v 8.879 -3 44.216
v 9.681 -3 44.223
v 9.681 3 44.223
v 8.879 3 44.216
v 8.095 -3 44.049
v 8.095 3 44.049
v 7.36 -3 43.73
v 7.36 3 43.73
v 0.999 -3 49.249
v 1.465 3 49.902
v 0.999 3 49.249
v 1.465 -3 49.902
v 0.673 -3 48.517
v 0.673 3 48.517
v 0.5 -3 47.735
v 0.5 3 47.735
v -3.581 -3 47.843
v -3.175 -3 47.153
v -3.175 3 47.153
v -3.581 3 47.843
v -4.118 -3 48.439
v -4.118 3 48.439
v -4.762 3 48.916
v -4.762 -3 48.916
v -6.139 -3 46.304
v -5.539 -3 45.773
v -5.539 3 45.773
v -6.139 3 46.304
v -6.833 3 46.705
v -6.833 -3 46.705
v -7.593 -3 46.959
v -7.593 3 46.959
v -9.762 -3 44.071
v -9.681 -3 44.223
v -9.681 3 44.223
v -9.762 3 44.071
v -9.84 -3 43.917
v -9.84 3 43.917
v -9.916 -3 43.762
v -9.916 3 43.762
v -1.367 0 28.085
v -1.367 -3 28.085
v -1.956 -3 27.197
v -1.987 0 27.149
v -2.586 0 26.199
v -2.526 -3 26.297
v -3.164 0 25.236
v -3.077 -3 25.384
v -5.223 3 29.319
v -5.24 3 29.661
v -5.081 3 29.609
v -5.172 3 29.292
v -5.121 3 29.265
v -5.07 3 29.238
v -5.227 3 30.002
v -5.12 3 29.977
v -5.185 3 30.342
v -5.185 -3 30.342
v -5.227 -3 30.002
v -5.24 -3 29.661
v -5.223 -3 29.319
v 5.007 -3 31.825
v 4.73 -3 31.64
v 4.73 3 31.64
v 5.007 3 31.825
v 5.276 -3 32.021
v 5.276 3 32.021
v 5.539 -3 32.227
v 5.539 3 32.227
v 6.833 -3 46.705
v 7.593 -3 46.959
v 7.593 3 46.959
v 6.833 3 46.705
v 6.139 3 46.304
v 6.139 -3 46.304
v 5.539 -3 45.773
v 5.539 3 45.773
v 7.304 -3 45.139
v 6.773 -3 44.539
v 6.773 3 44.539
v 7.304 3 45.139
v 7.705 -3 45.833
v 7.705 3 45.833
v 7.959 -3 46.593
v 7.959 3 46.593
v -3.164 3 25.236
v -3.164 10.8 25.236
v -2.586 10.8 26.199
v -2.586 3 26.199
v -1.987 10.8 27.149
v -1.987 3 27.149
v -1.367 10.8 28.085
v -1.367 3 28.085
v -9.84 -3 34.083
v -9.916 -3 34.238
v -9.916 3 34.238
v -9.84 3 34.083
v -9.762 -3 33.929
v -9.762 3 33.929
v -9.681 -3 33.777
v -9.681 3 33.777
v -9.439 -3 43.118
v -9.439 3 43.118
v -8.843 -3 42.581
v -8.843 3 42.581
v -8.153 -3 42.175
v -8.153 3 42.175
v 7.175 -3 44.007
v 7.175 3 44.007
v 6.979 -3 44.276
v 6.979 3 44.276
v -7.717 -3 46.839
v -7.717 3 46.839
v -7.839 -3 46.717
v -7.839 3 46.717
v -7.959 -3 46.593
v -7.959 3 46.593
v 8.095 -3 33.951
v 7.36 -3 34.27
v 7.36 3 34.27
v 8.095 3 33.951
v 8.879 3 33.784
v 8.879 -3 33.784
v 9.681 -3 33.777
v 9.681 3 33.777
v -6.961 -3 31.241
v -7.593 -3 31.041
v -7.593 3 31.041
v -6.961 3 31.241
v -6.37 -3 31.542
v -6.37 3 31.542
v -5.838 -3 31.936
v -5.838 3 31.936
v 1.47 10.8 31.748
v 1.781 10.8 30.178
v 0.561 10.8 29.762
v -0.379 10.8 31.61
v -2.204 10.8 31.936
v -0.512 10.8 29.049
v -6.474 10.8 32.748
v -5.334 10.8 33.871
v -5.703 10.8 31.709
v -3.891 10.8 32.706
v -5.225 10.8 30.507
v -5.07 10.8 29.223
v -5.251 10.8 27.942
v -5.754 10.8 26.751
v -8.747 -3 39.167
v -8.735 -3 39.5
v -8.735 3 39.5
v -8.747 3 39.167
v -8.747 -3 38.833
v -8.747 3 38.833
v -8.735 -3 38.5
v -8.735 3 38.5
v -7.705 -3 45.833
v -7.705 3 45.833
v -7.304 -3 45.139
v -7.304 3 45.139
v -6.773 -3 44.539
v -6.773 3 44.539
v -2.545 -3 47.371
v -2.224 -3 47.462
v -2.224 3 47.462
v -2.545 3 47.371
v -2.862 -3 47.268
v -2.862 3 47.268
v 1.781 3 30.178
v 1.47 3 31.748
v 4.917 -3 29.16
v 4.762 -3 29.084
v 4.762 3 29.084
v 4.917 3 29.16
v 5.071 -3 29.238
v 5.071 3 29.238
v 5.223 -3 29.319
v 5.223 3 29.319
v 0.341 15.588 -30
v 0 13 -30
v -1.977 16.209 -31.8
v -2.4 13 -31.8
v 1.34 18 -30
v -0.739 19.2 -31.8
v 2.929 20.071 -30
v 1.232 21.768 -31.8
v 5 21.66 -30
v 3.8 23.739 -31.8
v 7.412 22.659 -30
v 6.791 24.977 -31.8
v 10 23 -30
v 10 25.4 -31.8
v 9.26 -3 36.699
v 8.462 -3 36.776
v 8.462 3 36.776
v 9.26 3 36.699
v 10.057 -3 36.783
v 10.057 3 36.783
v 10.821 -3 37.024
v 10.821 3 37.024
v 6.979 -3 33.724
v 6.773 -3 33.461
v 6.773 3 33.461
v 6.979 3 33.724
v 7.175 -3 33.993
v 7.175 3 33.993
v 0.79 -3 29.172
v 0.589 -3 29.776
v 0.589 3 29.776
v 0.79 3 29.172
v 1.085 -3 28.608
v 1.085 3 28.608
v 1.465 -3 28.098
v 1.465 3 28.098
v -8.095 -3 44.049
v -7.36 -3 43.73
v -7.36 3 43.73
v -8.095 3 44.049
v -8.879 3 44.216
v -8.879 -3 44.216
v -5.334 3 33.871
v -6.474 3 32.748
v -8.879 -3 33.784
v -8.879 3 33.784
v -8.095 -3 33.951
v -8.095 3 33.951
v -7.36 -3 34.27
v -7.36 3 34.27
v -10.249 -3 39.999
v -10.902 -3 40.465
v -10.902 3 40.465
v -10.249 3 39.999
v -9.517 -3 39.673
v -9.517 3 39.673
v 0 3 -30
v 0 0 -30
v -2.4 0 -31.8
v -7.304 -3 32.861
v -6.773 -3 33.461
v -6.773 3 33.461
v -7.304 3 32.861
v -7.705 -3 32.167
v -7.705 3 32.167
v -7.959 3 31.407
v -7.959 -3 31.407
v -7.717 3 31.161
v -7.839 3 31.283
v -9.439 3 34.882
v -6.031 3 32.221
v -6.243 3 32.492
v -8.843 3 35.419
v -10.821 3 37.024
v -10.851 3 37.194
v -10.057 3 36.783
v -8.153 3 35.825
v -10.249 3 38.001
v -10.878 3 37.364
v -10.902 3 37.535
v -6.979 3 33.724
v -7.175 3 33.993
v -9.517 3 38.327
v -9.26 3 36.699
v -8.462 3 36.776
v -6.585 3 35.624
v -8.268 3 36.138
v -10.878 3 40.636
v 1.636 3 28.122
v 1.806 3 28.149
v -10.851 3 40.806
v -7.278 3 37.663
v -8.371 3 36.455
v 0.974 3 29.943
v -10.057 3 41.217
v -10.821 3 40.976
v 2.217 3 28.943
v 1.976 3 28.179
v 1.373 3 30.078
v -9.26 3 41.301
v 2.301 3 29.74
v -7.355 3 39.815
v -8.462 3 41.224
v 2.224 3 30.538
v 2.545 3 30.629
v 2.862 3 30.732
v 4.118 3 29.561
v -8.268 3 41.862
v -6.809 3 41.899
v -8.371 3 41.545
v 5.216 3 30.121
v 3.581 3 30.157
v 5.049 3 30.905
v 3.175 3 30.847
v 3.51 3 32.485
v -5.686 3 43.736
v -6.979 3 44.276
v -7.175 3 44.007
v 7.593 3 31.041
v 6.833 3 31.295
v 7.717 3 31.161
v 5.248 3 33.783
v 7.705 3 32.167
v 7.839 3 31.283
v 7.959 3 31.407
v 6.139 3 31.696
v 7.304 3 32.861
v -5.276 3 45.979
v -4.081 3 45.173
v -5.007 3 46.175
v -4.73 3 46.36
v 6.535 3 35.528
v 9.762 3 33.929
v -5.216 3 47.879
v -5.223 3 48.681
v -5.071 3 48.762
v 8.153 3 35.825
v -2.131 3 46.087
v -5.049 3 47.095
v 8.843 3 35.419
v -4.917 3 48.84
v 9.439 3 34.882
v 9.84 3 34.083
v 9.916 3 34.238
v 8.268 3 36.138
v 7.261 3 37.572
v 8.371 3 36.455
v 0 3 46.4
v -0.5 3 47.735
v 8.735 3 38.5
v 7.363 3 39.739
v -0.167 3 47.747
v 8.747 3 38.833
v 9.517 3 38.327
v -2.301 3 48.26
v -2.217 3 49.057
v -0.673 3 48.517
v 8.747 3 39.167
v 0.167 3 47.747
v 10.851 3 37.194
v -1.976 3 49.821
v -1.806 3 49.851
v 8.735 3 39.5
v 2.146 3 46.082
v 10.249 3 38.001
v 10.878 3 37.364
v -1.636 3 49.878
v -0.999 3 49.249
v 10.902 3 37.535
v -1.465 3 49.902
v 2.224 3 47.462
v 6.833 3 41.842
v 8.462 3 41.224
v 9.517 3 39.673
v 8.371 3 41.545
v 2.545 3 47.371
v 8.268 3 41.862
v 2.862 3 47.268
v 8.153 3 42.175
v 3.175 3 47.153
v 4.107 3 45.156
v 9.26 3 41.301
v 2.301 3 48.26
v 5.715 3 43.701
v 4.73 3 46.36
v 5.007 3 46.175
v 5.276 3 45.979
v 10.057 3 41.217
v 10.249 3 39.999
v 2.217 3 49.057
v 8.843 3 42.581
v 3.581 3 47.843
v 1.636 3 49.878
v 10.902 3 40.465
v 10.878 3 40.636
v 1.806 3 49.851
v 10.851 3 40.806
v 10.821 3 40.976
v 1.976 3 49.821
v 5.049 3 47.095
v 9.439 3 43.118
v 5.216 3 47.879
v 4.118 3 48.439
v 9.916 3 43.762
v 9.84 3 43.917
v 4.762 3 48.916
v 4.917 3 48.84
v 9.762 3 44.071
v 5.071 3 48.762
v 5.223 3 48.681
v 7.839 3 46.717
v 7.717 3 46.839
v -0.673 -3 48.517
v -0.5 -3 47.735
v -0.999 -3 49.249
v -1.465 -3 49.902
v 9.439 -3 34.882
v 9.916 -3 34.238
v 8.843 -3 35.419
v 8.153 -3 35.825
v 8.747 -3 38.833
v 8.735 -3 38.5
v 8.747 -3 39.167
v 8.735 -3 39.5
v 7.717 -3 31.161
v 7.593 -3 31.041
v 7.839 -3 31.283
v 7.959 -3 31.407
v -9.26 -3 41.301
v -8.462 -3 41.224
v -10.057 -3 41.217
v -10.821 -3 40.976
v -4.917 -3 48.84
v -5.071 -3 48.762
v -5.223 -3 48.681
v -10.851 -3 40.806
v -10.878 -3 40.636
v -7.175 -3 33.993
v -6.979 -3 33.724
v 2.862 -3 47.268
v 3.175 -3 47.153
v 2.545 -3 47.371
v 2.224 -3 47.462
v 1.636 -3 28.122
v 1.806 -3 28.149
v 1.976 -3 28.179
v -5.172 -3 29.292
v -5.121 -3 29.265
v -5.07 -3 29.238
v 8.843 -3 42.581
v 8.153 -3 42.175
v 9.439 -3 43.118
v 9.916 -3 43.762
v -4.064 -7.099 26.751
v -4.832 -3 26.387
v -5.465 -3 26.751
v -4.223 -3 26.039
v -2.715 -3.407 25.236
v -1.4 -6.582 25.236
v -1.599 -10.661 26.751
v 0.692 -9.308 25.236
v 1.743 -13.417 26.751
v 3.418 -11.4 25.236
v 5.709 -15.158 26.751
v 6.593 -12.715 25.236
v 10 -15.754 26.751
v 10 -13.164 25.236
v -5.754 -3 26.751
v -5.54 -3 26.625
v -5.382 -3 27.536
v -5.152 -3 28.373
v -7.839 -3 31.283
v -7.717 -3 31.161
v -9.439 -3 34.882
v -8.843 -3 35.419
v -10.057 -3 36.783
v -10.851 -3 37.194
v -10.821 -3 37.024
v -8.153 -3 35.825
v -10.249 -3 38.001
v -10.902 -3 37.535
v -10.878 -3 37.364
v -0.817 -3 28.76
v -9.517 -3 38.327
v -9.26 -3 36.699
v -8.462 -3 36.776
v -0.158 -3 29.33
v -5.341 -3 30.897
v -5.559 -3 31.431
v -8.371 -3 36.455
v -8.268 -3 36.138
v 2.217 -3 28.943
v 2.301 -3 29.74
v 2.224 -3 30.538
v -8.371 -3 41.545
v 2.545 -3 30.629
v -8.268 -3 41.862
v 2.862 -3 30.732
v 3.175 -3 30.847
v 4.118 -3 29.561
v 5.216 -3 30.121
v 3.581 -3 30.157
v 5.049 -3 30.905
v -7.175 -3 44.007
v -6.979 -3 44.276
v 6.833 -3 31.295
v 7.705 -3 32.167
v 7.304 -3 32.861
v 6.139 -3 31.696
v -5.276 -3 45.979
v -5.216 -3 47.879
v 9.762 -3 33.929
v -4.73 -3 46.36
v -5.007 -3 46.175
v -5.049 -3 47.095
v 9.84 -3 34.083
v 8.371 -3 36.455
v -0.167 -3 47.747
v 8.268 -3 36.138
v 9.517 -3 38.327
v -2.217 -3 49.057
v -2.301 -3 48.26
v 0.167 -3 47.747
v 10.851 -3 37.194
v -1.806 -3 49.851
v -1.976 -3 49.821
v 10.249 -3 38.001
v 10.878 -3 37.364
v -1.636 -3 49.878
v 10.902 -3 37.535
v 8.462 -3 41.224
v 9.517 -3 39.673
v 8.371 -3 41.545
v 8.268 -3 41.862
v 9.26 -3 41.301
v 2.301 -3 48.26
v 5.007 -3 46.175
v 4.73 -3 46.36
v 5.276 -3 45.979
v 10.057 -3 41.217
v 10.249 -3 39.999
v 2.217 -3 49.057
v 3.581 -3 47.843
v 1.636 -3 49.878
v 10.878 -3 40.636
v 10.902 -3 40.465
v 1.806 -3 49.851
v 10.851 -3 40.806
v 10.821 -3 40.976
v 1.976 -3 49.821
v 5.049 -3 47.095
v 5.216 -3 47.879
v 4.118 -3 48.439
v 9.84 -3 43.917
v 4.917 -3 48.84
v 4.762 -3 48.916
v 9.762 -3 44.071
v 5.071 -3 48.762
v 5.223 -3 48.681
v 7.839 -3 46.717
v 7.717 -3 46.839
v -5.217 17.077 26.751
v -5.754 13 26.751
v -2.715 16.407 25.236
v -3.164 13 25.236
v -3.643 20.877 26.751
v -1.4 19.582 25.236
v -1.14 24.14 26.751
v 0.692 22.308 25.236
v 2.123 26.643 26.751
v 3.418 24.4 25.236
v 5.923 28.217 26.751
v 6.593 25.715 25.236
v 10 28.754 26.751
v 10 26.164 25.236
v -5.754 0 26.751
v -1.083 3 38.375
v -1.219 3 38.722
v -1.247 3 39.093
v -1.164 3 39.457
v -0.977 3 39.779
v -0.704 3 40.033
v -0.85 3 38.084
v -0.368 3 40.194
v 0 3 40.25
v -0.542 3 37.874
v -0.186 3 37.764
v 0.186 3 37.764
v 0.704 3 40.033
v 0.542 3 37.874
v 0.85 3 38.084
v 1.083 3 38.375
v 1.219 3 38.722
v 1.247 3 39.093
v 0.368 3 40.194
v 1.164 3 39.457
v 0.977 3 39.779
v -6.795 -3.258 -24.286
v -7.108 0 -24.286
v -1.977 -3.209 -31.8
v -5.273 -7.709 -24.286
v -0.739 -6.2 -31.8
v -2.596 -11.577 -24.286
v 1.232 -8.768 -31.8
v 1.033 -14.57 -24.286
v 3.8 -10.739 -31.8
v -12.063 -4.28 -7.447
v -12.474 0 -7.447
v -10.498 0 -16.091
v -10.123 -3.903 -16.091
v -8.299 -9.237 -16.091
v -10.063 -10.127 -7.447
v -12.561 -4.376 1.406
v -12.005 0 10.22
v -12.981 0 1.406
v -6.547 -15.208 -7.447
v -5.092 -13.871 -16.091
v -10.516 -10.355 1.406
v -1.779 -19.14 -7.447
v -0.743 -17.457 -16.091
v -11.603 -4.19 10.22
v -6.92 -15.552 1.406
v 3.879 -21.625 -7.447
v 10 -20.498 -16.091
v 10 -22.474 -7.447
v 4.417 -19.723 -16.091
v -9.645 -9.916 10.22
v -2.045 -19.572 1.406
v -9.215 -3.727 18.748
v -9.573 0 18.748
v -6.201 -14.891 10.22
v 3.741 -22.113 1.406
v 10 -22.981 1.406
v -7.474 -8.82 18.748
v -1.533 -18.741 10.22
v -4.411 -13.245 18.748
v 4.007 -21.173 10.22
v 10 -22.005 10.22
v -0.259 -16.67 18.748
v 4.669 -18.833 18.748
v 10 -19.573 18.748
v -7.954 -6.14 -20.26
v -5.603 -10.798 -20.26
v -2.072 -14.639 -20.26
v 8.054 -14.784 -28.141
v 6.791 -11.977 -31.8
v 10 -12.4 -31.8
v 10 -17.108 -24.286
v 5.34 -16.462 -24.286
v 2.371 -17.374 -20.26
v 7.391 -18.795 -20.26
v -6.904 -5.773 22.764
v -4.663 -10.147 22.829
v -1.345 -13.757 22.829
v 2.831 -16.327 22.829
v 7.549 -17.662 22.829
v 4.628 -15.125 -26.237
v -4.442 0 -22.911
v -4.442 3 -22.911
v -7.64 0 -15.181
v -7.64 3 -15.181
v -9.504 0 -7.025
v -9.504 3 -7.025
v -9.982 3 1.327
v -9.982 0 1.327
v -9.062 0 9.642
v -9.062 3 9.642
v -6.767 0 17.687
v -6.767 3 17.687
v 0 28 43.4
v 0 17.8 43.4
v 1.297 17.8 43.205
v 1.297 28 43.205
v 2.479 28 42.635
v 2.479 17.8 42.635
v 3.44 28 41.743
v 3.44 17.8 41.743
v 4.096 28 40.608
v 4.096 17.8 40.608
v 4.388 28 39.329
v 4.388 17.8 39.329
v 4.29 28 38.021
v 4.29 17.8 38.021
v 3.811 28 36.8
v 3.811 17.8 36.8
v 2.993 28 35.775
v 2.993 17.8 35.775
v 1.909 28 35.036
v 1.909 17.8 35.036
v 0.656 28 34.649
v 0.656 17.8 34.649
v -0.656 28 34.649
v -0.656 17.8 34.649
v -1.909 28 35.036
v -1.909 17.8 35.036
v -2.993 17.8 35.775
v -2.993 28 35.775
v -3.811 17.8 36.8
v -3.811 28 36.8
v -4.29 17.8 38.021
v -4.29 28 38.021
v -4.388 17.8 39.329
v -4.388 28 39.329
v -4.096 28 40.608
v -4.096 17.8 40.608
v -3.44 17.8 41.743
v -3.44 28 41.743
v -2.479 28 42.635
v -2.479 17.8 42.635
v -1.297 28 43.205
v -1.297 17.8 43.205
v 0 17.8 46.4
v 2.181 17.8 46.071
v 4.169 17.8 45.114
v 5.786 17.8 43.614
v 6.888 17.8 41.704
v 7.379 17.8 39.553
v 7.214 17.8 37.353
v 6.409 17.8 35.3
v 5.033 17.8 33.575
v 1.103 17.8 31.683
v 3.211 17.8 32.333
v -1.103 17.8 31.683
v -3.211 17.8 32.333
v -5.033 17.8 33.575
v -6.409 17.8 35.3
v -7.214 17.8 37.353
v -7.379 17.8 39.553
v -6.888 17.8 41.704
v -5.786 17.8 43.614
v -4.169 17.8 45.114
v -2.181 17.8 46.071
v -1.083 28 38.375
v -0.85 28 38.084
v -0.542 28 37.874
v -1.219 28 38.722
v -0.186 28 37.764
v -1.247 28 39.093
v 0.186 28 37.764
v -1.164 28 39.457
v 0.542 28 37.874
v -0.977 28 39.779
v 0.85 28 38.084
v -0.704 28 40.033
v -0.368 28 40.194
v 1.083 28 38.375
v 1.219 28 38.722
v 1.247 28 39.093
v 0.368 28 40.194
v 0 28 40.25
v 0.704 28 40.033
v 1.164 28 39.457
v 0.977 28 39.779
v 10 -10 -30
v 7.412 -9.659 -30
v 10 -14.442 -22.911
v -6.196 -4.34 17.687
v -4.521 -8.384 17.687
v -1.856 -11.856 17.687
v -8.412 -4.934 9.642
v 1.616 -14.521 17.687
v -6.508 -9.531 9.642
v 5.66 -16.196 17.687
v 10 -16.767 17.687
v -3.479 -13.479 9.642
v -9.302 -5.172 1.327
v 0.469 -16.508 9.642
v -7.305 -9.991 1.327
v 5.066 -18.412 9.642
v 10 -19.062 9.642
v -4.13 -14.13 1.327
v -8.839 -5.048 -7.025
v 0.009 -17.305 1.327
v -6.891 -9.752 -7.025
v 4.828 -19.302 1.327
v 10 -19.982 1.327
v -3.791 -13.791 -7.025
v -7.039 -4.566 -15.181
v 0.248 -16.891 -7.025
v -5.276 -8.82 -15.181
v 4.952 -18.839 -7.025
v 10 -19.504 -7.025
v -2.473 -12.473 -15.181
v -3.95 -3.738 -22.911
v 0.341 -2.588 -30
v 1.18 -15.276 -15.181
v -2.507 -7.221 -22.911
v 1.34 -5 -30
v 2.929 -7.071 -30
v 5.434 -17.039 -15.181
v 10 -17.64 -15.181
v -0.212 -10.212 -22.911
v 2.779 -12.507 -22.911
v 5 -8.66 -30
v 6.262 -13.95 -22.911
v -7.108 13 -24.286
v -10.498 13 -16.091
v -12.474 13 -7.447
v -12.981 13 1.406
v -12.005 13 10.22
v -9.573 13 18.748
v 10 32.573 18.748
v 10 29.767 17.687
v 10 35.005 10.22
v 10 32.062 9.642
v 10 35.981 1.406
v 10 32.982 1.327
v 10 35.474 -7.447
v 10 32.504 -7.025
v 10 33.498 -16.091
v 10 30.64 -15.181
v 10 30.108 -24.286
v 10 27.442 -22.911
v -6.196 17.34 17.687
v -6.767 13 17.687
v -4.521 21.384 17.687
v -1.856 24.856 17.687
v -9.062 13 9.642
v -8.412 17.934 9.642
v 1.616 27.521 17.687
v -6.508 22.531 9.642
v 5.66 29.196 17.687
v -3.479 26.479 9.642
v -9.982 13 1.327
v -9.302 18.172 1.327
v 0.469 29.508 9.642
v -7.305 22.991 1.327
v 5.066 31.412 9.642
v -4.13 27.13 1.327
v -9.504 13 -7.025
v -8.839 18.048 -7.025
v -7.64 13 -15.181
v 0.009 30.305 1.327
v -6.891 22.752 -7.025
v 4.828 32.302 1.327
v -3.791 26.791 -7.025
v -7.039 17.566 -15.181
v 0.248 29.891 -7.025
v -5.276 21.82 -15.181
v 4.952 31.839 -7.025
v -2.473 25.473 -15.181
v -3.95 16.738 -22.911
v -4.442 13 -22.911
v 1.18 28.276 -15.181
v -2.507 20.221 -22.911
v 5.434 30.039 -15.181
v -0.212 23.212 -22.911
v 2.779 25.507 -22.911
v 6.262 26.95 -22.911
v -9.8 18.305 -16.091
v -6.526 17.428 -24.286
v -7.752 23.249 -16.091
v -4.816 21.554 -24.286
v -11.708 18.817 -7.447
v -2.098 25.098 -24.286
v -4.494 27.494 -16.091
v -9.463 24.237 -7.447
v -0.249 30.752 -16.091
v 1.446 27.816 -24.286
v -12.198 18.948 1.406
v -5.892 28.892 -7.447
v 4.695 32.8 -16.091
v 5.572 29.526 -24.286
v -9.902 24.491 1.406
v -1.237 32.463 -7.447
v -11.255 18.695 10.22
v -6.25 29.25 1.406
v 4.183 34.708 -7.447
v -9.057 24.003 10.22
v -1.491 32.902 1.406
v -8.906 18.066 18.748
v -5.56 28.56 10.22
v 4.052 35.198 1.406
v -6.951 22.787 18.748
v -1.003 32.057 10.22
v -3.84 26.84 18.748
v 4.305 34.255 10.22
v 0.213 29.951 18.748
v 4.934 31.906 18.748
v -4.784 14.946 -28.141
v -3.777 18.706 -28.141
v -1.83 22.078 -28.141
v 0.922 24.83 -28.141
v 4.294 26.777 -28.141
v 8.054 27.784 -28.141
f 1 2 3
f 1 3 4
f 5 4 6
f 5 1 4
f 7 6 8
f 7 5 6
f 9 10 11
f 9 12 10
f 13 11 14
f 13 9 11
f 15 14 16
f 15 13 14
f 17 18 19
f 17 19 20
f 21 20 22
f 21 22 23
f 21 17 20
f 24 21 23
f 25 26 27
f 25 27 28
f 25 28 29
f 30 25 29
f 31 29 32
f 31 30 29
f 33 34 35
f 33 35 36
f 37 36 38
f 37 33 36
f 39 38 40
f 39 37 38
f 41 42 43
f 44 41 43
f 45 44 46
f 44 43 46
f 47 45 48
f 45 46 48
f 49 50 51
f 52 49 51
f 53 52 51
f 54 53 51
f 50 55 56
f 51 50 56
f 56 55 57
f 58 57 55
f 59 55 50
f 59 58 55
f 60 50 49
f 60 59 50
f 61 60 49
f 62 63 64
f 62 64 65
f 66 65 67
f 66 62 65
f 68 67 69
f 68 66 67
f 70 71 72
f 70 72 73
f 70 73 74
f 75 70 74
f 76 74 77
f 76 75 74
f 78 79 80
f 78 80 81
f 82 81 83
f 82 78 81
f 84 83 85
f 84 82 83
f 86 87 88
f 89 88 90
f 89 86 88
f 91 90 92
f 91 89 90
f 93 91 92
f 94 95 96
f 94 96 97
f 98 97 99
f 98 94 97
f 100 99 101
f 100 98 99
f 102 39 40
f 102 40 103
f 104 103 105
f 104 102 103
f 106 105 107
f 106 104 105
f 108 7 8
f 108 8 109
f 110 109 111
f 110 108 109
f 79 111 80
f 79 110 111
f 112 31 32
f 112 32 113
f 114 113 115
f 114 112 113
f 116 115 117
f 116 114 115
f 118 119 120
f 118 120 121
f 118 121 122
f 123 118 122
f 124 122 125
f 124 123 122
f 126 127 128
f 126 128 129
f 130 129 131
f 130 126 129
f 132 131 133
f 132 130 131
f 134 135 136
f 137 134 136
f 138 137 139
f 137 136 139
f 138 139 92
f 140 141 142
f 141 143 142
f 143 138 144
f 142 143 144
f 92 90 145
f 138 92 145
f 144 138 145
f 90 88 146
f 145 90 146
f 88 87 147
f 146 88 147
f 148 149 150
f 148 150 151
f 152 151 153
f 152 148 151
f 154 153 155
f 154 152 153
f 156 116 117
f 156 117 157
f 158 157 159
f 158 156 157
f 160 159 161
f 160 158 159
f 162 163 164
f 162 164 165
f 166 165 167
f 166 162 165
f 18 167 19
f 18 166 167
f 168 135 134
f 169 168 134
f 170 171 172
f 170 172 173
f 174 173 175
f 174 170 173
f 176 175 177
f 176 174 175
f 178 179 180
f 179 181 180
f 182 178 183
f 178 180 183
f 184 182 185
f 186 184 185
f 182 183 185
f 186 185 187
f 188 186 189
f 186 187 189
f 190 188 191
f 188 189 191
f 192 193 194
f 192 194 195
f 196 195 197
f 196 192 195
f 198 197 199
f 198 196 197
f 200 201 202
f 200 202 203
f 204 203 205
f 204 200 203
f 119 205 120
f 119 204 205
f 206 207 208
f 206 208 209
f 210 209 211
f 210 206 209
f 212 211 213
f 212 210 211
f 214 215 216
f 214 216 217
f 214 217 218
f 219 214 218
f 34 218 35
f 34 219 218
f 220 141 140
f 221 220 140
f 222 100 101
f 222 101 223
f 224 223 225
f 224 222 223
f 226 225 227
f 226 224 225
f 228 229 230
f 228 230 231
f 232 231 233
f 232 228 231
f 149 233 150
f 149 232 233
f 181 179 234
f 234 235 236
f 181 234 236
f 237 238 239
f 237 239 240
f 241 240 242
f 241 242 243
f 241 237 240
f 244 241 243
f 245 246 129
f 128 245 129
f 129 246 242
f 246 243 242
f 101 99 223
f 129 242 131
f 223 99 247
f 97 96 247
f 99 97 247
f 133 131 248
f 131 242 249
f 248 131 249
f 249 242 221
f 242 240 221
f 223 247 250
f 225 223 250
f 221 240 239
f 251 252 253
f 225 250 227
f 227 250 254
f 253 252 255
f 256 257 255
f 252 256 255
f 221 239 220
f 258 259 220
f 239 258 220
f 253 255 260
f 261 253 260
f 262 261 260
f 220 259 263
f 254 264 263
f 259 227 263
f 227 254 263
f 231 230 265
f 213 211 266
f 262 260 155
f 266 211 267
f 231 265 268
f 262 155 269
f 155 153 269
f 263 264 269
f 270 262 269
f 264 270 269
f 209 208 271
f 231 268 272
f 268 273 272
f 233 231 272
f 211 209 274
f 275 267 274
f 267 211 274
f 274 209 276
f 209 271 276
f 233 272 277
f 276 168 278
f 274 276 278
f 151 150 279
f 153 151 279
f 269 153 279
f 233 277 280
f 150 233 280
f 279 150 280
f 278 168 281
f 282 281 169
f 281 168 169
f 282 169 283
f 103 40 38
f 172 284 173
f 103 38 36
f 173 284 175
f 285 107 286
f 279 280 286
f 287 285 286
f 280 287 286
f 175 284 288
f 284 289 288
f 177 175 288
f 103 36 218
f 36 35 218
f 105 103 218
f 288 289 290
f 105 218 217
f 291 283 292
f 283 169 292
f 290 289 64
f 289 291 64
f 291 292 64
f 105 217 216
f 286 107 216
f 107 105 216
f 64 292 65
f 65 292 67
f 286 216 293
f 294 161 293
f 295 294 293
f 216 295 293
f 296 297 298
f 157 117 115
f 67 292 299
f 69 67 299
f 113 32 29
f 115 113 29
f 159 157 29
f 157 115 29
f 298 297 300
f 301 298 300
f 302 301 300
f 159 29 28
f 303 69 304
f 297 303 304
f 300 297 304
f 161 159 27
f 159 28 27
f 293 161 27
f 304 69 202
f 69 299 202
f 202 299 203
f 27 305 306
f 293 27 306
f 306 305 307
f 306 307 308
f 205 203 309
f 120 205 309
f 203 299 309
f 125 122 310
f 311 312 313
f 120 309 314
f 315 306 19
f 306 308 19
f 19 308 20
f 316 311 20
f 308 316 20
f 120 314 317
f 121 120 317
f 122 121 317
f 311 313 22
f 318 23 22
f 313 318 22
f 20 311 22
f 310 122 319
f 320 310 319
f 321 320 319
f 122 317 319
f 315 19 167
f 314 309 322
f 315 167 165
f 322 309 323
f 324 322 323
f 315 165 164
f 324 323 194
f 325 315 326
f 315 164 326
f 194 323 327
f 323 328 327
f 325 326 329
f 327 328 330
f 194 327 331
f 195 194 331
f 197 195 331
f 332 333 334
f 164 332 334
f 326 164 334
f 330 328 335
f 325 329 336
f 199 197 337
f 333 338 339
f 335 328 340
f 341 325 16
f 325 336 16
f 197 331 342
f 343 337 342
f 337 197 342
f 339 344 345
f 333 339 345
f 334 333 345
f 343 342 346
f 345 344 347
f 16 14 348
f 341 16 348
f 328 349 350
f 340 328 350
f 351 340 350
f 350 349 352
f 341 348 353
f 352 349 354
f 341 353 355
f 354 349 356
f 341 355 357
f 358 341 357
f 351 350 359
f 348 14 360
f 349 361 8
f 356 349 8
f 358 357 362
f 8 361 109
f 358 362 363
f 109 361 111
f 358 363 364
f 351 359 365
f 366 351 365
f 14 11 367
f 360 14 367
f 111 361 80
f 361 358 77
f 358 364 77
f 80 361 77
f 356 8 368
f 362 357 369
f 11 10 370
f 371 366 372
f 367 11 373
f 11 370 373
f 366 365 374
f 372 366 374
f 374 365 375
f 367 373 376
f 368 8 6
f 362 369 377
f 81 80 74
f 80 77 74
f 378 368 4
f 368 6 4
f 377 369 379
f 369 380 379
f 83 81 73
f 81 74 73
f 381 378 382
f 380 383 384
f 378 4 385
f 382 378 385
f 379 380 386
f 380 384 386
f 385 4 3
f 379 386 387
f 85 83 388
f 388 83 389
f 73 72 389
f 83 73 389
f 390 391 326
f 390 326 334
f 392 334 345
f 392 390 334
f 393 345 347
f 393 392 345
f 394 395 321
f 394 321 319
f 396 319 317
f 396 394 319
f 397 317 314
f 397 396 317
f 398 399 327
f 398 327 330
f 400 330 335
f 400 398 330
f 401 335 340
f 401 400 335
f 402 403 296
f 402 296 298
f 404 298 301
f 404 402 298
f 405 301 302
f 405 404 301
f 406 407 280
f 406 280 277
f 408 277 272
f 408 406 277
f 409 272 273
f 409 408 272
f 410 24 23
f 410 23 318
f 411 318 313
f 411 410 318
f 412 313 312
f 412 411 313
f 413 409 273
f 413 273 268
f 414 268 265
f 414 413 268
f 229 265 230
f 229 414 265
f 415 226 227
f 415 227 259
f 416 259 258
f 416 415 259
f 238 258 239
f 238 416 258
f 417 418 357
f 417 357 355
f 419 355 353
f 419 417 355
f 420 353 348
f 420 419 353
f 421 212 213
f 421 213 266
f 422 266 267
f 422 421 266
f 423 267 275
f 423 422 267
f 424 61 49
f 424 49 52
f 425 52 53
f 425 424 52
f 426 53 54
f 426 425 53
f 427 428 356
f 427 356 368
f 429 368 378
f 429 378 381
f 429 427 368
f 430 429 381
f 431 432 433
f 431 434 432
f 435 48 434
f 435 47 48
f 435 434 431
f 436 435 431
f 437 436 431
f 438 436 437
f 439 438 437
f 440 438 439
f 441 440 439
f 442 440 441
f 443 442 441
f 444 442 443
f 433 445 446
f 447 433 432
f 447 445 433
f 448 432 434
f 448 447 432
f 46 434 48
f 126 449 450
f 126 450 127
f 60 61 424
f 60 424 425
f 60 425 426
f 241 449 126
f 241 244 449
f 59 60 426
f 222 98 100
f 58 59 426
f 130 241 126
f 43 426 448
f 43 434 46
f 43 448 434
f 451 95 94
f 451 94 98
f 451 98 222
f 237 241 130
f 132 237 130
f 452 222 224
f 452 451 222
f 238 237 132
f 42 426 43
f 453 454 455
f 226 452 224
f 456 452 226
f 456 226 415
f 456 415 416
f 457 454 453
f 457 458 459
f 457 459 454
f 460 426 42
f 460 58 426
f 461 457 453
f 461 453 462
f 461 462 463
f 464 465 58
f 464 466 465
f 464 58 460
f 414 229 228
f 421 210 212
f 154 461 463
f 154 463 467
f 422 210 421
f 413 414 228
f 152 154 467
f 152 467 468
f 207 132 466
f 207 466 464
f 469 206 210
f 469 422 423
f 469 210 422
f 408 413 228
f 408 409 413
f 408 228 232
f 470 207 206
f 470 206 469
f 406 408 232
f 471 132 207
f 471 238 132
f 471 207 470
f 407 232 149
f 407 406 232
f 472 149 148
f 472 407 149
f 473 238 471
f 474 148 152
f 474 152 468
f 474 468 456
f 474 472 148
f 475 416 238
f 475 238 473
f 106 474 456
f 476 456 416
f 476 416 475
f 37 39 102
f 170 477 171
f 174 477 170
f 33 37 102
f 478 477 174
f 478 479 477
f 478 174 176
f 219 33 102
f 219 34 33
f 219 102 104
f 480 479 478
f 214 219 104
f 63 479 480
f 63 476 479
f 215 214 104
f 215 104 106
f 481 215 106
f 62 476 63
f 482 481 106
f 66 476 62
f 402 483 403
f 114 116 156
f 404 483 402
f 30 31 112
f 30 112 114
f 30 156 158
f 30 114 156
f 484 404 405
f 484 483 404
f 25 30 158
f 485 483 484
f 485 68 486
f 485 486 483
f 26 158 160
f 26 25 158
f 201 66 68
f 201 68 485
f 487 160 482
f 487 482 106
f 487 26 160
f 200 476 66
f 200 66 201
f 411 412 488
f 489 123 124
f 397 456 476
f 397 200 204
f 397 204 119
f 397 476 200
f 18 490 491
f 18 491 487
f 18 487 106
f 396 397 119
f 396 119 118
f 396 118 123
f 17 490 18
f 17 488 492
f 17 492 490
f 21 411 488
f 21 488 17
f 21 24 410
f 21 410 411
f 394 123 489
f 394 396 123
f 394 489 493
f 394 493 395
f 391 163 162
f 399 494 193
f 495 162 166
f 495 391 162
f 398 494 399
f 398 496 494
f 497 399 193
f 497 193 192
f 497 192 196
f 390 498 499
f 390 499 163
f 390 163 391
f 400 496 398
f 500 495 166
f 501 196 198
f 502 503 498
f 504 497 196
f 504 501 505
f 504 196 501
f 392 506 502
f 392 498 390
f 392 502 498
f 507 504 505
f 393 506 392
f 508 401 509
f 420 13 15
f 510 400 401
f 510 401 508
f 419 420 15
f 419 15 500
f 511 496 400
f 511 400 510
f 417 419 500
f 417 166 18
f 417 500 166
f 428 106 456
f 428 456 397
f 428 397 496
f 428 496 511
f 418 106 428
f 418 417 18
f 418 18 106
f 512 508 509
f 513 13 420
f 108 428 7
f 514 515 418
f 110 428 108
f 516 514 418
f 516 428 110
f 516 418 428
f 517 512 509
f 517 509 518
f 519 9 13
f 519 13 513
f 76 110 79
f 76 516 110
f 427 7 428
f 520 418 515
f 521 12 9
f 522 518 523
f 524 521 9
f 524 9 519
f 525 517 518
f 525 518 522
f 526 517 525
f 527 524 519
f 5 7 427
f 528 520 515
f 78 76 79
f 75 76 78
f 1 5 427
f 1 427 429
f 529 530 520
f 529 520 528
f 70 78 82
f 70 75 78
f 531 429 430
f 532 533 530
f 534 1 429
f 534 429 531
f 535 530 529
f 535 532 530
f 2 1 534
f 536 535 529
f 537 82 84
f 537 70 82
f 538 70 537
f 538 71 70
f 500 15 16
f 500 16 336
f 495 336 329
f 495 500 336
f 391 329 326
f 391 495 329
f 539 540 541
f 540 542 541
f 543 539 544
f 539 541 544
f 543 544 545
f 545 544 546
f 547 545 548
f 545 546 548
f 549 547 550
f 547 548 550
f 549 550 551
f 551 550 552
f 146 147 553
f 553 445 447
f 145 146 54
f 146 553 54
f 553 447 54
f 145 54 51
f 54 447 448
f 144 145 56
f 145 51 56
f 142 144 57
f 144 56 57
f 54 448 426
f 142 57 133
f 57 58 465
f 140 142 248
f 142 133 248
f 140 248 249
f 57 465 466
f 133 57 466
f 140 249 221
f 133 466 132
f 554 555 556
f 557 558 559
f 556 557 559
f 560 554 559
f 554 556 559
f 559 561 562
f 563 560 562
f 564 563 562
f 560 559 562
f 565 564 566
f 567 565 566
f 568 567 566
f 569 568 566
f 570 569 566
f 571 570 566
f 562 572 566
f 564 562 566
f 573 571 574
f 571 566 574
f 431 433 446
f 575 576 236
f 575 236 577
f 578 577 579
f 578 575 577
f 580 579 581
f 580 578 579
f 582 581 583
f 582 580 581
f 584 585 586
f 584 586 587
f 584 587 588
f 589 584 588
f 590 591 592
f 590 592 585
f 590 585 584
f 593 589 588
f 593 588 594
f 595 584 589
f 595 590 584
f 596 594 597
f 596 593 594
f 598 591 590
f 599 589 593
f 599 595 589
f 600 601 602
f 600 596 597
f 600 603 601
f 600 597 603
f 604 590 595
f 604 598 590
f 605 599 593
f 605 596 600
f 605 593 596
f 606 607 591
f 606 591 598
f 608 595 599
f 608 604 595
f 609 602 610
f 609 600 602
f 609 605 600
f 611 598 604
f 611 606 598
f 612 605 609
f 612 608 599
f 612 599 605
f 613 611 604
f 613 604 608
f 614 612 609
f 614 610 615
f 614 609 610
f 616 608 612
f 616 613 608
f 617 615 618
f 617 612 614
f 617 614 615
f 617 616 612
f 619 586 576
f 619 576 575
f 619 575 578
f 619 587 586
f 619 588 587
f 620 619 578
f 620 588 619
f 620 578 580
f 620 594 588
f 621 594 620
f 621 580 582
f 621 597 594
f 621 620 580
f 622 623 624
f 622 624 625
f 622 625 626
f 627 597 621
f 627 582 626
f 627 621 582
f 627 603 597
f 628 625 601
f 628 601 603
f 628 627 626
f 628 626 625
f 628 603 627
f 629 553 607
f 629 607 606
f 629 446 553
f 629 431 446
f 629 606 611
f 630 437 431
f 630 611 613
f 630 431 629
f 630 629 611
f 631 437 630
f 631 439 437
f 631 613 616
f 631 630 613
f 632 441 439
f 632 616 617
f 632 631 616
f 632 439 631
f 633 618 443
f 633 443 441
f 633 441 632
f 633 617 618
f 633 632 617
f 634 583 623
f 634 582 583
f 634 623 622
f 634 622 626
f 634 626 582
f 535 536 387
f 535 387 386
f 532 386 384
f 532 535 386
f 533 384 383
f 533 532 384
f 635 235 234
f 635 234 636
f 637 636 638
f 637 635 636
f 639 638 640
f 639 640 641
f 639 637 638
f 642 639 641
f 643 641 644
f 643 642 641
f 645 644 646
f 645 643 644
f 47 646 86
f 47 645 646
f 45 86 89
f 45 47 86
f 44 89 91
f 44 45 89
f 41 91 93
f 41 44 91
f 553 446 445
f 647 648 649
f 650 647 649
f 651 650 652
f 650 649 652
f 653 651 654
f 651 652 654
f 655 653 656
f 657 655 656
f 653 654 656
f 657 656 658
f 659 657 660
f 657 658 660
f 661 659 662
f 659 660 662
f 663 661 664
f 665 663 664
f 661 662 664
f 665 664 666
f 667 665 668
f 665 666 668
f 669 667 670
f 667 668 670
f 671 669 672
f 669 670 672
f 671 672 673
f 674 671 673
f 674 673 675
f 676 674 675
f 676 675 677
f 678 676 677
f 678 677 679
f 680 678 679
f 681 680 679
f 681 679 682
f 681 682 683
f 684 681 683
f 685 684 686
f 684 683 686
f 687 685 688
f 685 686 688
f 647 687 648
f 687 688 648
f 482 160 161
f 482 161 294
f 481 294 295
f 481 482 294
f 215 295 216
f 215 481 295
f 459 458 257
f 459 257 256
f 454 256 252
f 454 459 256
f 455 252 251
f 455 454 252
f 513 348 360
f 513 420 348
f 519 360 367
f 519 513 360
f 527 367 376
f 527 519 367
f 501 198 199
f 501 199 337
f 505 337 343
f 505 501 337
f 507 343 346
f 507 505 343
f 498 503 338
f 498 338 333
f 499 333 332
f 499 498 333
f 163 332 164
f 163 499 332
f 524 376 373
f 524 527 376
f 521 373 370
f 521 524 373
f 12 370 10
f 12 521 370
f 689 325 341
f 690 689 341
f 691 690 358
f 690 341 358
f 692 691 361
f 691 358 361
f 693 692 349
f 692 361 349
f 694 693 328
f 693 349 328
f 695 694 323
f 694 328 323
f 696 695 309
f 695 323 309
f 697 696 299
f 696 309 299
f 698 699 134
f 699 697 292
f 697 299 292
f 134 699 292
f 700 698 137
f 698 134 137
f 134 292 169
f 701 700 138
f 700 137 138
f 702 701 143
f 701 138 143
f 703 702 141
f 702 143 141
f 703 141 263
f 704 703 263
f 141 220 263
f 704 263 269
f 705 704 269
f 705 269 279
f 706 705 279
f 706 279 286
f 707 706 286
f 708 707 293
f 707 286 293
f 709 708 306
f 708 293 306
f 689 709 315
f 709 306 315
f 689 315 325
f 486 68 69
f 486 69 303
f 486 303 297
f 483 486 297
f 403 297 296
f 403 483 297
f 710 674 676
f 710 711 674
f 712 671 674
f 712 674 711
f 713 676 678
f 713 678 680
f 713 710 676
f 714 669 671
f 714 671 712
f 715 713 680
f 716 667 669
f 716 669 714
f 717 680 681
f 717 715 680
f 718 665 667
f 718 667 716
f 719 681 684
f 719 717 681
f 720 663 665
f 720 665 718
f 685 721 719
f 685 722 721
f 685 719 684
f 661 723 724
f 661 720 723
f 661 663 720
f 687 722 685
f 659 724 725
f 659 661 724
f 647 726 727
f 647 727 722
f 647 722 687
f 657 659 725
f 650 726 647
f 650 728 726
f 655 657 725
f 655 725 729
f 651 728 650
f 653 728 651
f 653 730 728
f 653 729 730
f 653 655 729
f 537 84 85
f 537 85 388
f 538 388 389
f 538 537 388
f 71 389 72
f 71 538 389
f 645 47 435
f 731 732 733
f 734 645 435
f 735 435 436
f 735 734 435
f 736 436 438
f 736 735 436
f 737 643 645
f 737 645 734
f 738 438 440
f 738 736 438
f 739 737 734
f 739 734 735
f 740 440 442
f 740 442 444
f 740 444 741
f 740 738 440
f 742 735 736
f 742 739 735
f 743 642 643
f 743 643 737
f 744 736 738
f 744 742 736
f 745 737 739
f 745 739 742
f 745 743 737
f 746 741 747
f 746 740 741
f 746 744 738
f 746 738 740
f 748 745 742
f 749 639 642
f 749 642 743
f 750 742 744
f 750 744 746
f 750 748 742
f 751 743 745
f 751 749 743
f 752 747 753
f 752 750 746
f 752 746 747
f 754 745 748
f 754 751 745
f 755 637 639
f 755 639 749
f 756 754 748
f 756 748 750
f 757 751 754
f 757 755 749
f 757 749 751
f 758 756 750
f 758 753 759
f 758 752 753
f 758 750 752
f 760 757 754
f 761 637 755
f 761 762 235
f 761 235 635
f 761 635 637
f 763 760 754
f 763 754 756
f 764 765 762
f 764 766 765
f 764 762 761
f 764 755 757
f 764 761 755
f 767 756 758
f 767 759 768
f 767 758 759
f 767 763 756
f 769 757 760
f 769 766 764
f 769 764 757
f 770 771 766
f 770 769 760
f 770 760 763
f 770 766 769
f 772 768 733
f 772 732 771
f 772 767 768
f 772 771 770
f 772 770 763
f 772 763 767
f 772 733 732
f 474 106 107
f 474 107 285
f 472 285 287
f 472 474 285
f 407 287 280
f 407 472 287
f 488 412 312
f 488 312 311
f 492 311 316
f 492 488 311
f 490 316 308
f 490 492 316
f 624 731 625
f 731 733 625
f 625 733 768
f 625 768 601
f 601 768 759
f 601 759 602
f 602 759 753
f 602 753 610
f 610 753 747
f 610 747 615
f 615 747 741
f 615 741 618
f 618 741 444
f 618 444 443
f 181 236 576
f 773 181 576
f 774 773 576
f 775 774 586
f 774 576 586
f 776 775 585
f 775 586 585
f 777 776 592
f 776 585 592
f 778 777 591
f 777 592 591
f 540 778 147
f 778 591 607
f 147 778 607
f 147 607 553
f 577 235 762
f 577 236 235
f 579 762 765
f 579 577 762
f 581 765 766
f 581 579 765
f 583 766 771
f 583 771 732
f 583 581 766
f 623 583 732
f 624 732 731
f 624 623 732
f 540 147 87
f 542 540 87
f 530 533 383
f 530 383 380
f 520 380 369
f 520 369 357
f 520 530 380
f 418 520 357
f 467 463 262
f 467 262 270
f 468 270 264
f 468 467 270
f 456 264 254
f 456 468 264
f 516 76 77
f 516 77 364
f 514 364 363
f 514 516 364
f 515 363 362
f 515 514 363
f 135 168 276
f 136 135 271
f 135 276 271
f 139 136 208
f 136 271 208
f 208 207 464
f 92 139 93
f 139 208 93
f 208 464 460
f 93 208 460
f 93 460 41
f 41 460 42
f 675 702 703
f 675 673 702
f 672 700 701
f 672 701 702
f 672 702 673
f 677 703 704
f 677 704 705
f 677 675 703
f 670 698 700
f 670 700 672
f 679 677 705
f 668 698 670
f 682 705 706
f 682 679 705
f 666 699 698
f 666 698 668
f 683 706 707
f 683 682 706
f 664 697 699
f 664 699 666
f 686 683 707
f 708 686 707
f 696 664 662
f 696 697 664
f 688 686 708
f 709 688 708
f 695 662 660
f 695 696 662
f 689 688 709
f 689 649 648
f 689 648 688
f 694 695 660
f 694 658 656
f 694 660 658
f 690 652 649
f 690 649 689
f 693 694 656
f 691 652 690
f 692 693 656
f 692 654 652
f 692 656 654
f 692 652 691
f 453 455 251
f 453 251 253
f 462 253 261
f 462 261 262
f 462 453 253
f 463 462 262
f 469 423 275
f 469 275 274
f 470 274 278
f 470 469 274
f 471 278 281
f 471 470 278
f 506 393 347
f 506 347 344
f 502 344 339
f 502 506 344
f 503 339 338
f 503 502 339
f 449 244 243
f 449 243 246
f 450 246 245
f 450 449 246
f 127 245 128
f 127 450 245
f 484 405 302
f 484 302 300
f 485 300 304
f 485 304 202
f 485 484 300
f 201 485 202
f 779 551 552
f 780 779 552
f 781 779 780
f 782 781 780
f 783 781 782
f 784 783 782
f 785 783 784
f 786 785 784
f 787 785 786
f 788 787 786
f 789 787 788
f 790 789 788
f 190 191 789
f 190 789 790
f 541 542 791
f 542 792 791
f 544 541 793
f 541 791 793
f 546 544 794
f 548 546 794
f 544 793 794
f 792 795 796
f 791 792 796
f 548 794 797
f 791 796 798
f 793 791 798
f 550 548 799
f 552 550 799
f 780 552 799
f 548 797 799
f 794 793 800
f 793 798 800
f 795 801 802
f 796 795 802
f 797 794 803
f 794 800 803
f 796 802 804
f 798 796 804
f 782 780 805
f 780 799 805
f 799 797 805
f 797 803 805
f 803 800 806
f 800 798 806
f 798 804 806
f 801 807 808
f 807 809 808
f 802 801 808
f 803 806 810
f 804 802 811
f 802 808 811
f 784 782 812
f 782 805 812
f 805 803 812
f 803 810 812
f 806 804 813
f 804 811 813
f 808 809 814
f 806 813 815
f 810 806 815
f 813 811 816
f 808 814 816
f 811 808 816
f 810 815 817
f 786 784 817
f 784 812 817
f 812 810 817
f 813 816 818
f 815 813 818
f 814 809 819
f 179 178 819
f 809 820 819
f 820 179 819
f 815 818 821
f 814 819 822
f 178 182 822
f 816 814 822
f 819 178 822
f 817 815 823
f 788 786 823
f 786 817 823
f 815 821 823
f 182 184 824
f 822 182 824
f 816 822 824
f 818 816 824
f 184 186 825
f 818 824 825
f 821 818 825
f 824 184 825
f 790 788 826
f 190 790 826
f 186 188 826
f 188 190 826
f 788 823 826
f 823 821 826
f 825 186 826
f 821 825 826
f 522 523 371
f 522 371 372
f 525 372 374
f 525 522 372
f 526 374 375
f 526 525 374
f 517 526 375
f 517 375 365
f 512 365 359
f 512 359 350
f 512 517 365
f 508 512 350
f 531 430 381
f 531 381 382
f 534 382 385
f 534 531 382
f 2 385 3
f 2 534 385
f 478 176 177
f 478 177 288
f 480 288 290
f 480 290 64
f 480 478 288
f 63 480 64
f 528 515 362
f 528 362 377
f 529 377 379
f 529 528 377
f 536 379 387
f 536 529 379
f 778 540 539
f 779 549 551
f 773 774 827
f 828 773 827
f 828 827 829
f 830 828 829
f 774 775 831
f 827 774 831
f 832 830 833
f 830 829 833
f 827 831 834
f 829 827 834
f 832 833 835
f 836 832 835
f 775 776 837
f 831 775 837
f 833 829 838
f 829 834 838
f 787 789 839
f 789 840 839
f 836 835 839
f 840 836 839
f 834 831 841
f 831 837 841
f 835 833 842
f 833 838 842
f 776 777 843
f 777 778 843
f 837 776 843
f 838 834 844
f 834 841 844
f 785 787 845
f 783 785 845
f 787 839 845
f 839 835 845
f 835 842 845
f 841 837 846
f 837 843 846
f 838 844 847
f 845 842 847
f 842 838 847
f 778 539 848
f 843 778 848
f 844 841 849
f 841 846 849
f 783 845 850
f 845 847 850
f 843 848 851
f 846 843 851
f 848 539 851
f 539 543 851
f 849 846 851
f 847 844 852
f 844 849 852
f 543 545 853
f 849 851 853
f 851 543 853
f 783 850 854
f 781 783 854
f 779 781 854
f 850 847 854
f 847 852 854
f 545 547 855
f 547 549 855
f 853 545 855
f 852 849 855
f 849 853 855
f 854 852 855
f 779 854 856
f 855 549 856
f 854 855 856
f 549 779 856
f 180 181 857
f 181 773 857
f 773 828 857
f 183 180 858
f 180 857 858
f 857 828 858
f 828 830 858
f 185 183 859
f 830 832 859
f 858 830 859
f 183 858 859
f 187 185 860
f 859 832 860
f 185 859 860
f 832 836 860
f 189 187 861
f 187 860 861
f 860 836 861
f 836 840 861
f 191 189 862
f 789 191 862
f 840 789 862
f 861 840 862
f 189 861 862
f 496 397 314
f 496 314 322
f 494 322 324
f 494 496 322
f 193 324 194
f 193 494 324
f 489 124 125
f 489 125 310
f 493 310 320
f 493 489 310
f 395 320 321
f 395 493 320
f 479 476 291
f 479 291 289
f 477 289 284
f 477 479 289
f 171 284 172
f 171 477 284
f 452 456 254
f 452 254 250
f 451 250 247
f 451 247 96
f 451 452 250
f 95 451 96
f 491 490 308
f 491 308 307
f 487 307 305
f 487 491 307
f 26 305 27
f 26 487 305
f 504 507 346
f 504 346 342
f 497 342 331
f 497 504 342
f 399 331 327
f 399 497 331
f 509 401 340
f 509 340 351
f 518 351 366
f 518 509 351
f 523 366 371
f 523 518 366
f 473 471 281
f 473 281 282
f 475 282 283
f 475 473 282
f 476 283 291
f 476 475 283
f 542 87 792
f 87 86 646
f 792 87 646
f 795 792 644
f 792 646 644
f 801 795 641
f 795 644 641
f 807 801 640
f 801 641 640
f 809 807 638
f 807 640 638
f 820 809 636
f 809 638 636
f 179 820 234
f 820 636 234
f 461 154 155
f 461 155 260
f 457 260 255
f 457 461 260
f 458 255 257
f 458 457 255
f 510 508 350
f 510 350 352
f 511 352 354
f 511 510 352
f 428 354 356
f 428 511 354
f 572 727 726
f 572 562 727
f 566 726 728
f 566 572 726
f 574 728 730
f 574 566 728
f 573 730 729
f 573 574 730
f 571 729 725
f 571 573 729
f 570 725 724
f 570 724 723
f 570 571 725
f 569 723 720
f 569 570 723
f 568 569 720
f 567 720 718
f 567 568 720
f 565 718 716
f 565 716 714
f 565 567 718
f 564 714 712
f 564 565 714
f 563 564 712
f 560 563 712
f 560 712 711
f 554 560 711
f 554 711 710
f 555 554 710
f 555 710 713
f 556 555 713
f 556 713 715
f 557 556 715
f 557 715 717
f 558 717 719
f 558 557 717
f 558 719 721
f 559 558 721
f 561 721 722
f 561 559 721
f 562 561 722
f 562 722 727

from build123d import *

# Parameters (mm, degrees)
SKETCH_1_R          = 1.25
EXTRUDE_2_DEPTH     = 3
EXTRUDE_6_DEPTH     = 10
REVOLVE_5_ANGLE     = 90
SKETCH_5_R          = 7.4
SKETCH_5_R_2        = 1.25
EXTRUDE_3_DEPTH     = 14.8
SKETCH_6_R          = 4.4
SKETCH_6_R_2        = 1.25
EXTRUDE_4_DEPTH     = 10.2
REVOLVE_6_ANGLE     = 90
EXTRUDE_7_DEPTH     = 7.8
CUT_EXTRUDE_1_DEPTH = 3
EXTRUDE_START       = 3
EXTRUDE_9_DEPTH     = 3
EXTRUDE_10_DEPTH    = 3


with BuildPart() as part:
    # 草图1 → 凸台-拉伸2 (new body)
    with BuildSketch(Plane(origin=(0, 0, 0), x_dir=(1, 0, 0), z_dir=(0, 1, 0))):
        with BuildLine():
            Line((-2.4, 31.8), (0, 30))
            ThreePointArc((0, 30), (-9.986161593, 1.176286204), (-1.366875999, -28.085255385))
            ThreePointArc((-1.366875999, -28.085255385), (0.001505949, -29.44044019), (1.780593172, -30.177897759))
            ThreePointArc((1.780593172, -30.177897759), (2.675299798, -47.593181657), (-6.473683781, -32.747686964))
            ThreePointArc((-6.473683781, -32.747686964), (-5.105814689, -29.870106713), (-5.753780394, -26.750543539))
            ThreePointArc((-5.753780394, -26.750543539), (-12.913266641, 3.030876667), (-2.4, 31.8))
        make_face()
        with Locations(Location((0, -39, 0), (0, 0, 270))):
            Circle(SKETCH_1_R, mode=Mode.SUBTRACT)
    extrude(amount=EXTRUDE_2_DEPTH)

    # 草图2 → 凸台-拉伸6 (add)
    with BuildSketch(Plane(origin=(0, 3, 0), x_dir=(1, 0, 0), z_dir=(0, 1, 0))):
        with BuildLine():
            Line((-5.753780394, -26.750543539), (-3.163943768, -25.236361829))
            ThreePointArc((-3.163943768, -25.236361829), (-9.918176076, 2.85931761), (0, 30))
            Line((0, 30), (-2.4, 31.8))
            ThreePointArc((-2.4, 31.8), (-12.913266641, 3.030876667), (-5.753780394, -26.750543539))
        make_face()
    extrude(amount=EXTRUDE_6_DEPTH)

    # 草图3 → 旋转5 (revolve)
    with BuildSketch(Plane.XZ):
        with BuildLine():
            Line((0, -30), (-2.4, -31.8))
            ThreePointArc((-2.4, -31.8), (-12.913266641, -3.030876667), (-5.753780394, 26.750543539))
            Line((-5.753780394, 26.750543539), (-3.163943768, 25.236361829))
            ThreePointArc((-3.163943768, 25.236361829), (-9.918176076, -2.85931761), (0, -30))
        make_face()
    revolve(axis=Axis((10, 0, 8.965056224), (0, 0, 1)), revolution_arc=REVOLVE_5_ANGLE)

    # 草图5 → 凸台-拉伸3 (add)
    with BuildSketch(Plane(origin=(0, 3, 0), x_dir=(1, 0, 0), z_dir=(0, 1, 0))):
        with Locations(Location((0, -39, 0), (0, 0, 270))):
            Circle(SKETCH_5_R)
        with Locations(Location((0, -39, 0), (0, 0, 270))):
            Circle(SKETCH_5_R_2, mode=Mode.SUBTRACT)
    extrude(amount=EXTRUDE_3_DEPTH)

    # 草图6 → 凸台-拉伸4 (add)
    with BuildSketch(Plane(origin=(0, 17.8, 0), x_dir=(1, 0, 0), z_dir=(0, 1, 0))):
        with Locations(Location((0, -39, 0), (0, 0, 270))):
            Circle(SKETCH_6_R)
        with Locations(Location((0, -39, 0), (0, 0, 270))):
            Circle(SKETCH_6_R_2, mode=Mode.SUBTRACT)
    extrude(amount=EXTRUDE_4_DEPTH)

    # 草图8 → 旋转6 (revolve)
    with BuildSketch(Plane(origin=(0, 13, 0), x_dir=(1, 0, 0), z_dir=(0, 1, 0))):
        with BuildLine():
            Line((0, 30), (-2.4, 31.8))
            ThreePointArc((-2.4, 31.8), (-12.913266641, 3.030876667), (-5.753780394, -26.750543539))
            Line((-5.753780394, -26.750543539), (-3.163943768, -25.236361829))
            ThreePointArc((-3.163943768, -25.236361829), (-9.918176076, 2.85931761), (0, 30))
        make_face()
    revolve(axis=Axis((10, 13, 0), (0, 0, -1)), revolution_arc=REVOLVE_6_ANGLE)

    # 草图9 → 凸台-拉伸7 (add)
    with BuildSketch(Plane(origin=(0, 3, 0), x_dir=(1, 0, 0), z_dir=(0, 1, 0))):
        with BuildLine():
            Line((-5.33393747, -33.870759212), (-6.473683781, -32.747686964))
            ThreePointArc((-6.473683781, -32.747686964), (-5.105814689, -29.870106713), (-5.753780394, -26.750543539))
            Line((-5.753780394, -26.750543539), (-3.163943768, -25.236361829))
            ThreePointArc((-3.163943768, -25.236361829), (-2.289406726, -26.675945695), (-1.366875999, -28.085255385))
            ThreePointArc((-1.366875999, -28.085255385), (0.001505949, -29.44044019), (1.780593172, -30.177897759))
            Line((1.780593172, -30.177897759), (1.470312727, -31.747539694))
            ThreePointArc((1.470312727, -31.747539694), (-2.204294517, -31.935929949), (-5.33393747, -33.870759212))
        make_face()
    extrude(amount=EXTRUDE_7_DEPTH)

    # 草图12 → 切除-拉伸1 (cut)
    with BuildSketch(Plane.XZ):
        with BuildLine():
            Line((-6.473683781, 32.747686964), (0, 39))
            Line((0, 39), (1.780593172, 30.177897759))
            ThreePointArc((1.780593172, 30.177897759), (2.675299798, 47.593181657), (-6.473683781, 32.747686964))
        make_face()
    extrude(amount=-CUT_EXTRUDE_1_DEPTH, mode=Mode.SUBTRACT)

    # 草图14 → 凸台-拉伸9 (add)
    with BuildSketch(Plane.XZ.offset(EXTRUDE_START)):
        with BuildLine():
            Line((-6.473683781, 32.747686964), (1.780593172, 30.177897759))
            ThreePointArc((1.780593172, 30.177897759), (0.001505949, 29.44044019), (-1.366875999, 28.085255385))
            ThreePointArc((-1.366875999, 28.085255385), (-2.289406726, 26.675945695), (-3.163943768, 25.236361829))
            Line((-3.163943768, 25.236361829), (-5.753780394, 26.750543539))
            ThreePointArc((-5.753780394, 26.750543539), (-5.105814689, 29.870106713), (-6.473683781, 32.747686964))
        make_face()
    extrude(amount=-EXTRUDE_9_DEPTH)

    # 草图13 → 凸台-拉伸10 (add, symmetric)
    with BuildSketch(Plane.XZ):
        with BuildLine():
            ThreePointArc((1.464956435, 49.902013697), (0.818060825, 48.891552344), (0.499924007, 47.734705318))
            ThreePointArc((0.499924007, 47.734705318), (0, 47.749), (-0.499924007, 47.734705318))
            ThreePointArc((-0.499924007, 47.734705318), (-0.818060825, 48.891552344), (-1.464956435, 49.902013697))
            ThreePointArc((-1.464956435, 49.902013697), (-1.720779115, 49.864571747), (-1.975651141, 49.821127601))
            ThreePointArc((-1.975651141, 49.821127601), (-2.278635697, 48.66022001), (-2.223716399, 47.461683425))
            ThreePointArc((-2.223716399, 47.461683425), (-2.703589684, 47.320793461), (-3.174628369, 47.152713396))
            ThreePointArc((-3.174628369, 47.152713396), (-3.834679853, 48.154630615), (-4.762163869, 48.915734733))
            ThreePointArc((-4.762163869, 48.915734733), (-4.993895497, 48.801071766), (-5.222868219, 48.680994141))
            ThreePointArc((-5.222868219, 48.680994141), (-5.15228348, 47.483278035), (-4.729683951, 46.360373002))
            ThreePointArc((-4.729683951, 46.360373002), (-5.142533172, 46.078089684), (-5.538577987, 45.772677084))
            ThreePointArc((-5.538577987, 45.772677084), (-6.4759337, 46.521589858), (-7.593217523, 46.958834566))
            ThreePointArc((-7.593217523, 46.958834566), (-7.778174593, 46.778174593), (-7.958834566, 46.593217523))
            ThreePointArc((-7.958834566, 46.593217523), (-7.521589858, 45.4759337), (-6.772677084, 44.538577987))
            ThreePointArc((-6.772677084, 44.538577987), (-7.078089684, 44.142533172), (-7.360373002, 43.729683951))
            ThreePointArc((-7.360373002, 43.729683951), (-8.483278035, 44.15228348), (-9.680994141, 44.222868219))
            ThreePointArc((-9.680994141, 44.222868219), (-9.801071766, 43.993895497), (-9.915734733, 43.762163869))
            ThreePointArc((-9.915734733, 43.762163869), (-9.154630615, 42.834679853), (-8.152713396, 42.174628369))
            ThreePointArc((-8.152713396, 42.174628369), (-8.320793461, 41.703589684), (-8.461683425, 41.223716399))
            ThreePointArc((-8.461683425, 41.223716399), (-9.66022001, 41.278635697), (-10.821127601, 40.975651141))
            ThreePointArc((-10.821127601, 40.975651141), (-10.864571747, 40.720779115), (-10.902013697, 40.464956435))
            ThreePointArc((-10.902013697, 40.464956435), (-9.891552344, 39.818060825), (-8.734705318, 39.499924007))
            ThreePointArc((-8.734705318, 39.499924007), (-8.749, 39), (-8.734705318, 38.500075993))
            ThreePointArc((-8.734705318, 38.500075993), (-9.891552344, 38.181939175), (-10.902013697, 37.535043565))
            ThreePointArc((-10.902013697, 37.535043565), (-10.864571747, 37.279220885), (-10.821127601, 37.024348859))
            ThreePointArc((-10.821127601, 37.024348859), (-9.66022001, 36.721364303), (-8.461683425, 36.776283601))
            ThreePointArc((-8.461683425, 36.776283601), (-8.320793461, 36.296410316), (-8.152713396, 35.825371631))
            ThreePointArc((-8.152713396, 35.825371631), (-9.154630615, 35.165320147), (-9.915734733, 34.237836131))
            ThreePointArc((-9.915734733, 34.237836131), (-9.801071766, 34.006104503), (-9.680994141, 33.777131781))
            ThreePointArc((-9.680994141, 33.777131781), (-8.483278035, 33.84771652), (-7.360373002, 34.270316049))
            ThreePointArc((-7.360373002, 34.270316049), (-7.078089684, 33.857466828), (-6.772677084, 33.461422013))
            ThreePointArc((-6.772677084, 33.461422013), (-7.521589858, 32.5240663), (-7.958834566, 31.406782477))
            ThreePointArc((-7.958834566, 31.406782477), (-7.778174593, 31.221825407), (-7.593217523, 31.041165434))
            ThreePointArc((-7.593217523, 31.041165434), (-6.4759337, 31.478410142), (-5.538577987, 32.227322916))
            ThreePointArc((-5.538577987, 32.227322916), (-5.142533172, 31.921910316), (-4.729683951, 31.639626998))
            ThreePointArc((-4.729683951, 31.639626998), (-5.15228348, 30.516721965), (-5.222868219, 29.319005859))
            ThreePointArc((-5.222868219, 29.319005859), (-4.993895497, 29.198928234), (-4.762163869, 29.084265267))
            ThreePointArc((-4.762163869, 29.084265267), (-3.834679853, 29.845369385), (-3.174628369, 30.847286604))
            ThreePointArc((-3.174628369, 30.847286604), (-2.703589684, 30.679206539), (-2.223716399, 30.538316575))
            ThreePointArc((-2.223716399, 30.538316575), (-2.278635697, 29.33977999), (-1.975651141, 28.178872399))
            ThreePointArc((-1.975651141, 28.178872399), (-1.720779115, 28.135428253), (-1.464956435, 28.097986303))
            ThreePointArc((-1.464956435, 28.097986303), (-0.818060825, 29.108447656), (-0.499924007, 30.265294682))
            ThreePointArc((-0.499924007, 30.265294682), (0, 30.251), (0.499924007, 30.265294682))
            ThreePointArc((0.499924007, 30.265294682), (0.818060825, 29.108447656), (1.464956435, 28.097986303))
            ThreePointArc((1.464956435, 28.097986303), (1.720779115, 28.135428253), (1.975651141, 28.178872399))
            ThreePointArc((1.975651141, 28.178872399), (2.278635697, 29.33977999), (2.223716399, 30.538316575))
            ThreePointArc((2.223716399, 30.538316575), (2.703589684, 30.679206539), (3.174628369, 30.847286604))
            ThreePointArc((3.174628369, 30.847286604), (3.834679853, 29.845369385), (4.762163869, 29.084265267))
            ThreePointArc((4.762163869, 29.084265267), (4.993895497, 29.198928234), (5.222868219, 29.319005859))
            ThreePointArc((5.222868219, 29.319005859), (5.15228348, 30.516721965), (4.729683951, 31.639626998))
            ThreePointArc((4.729683951, 31.639626998), (5.142533172, 31.921910316), (5.538577987, 32.227322916))
            ThreePointArc((5.538577987, 32.227322916), (6.4759337, 31.478410142), (7.593217523, 31.041165434))
            ThreePointArc((7.593217523, 31.041165434), (7.778174593, 31.221825407), (7.958834566, 31.406782477))
            ThreePointArc((7.958834566, 31.406782477), (7.521589858, 32.5240663), (6.772677084, 33.461422013))
            ThreePointArc((6.772677084, 33.461422013), (7.078089684, 33.857466828), (7.360373002, 34.270316049))
            ThreePointArc((7.360373002, 34.270316049), (8.483278035, 33.84771652), (9.680994141, 33.777131781))
            ThreePointArc((9.680994141, 33.777131781), (9.801071766, 34.006104503), (9.915734733, 34.237836131))
            ThreePointArc((9.915734733, 34.237836131), (9.154630615, 35.165320147), (8.152713396, 35.825371631))
            ThreePointArc((8.152713396, 35.825371631), (8.320793461, 36.296410316), (8.461683425, 36.776283601))
            ThreePointArc((8.461683425, 36.776283601), (9.66022001, 36.721364303), (10.821127601, 37.024348859))
            ThreePointArc((10.821127601, 37.024348859), (10.864571747, 37.279220885), (10.902013697, 37.535043565))
            ThreePointArc((10.902013697, 37.535043565), (9.891552344, 38.181939175), (8.734705318, 38.500075993))
            ThreePointArc((8.734705318, 38.500075993), (8.749, 39), (8.734705318, 39.499924007))
            ThreePointArc((8.734705318, 39.499924007), (9.891552344, 39.818060825), (10.902013697, 40.464956435))
            ThreePointArc((10.902013697, 40.464956435), (10.864571747, 40.720779115), (10.821127601, 40.975651141))
            ThreePointArc((10.821127601, 40.975651141), (9.66022001, 41.278635697), (8.461683425, 41.223716399))
            ThreePointArc((8.461683425, 41.223716399), (8.320793461, 41.703589684), (8.152713396, 42.174628369))
            ThreePointArc((8.152713396, 42.174628369), (9.154630615, 42.834679853), (9.915734733, 43.762163869))
            ThreePointArc((9.915734733, 43.762163869), (9.801071766, 43.993895497), (9.680994141, 44.222868219))
            ThreePointArc((9.680994141, 44.222868219), (8.483278035, 44.15228348), (7.360373002, 43.729683951))
            ThreePointArc((7.360373002, 43.729683951), (7.078089684, 44.142533172), (6.772677084, 44.538577987))
            ThreePointArc((6.772677084, 44.538577987), (7.521589858, 45.4759337), (7.958834566, 46.593217523))
            ThreePointArc((7.958834566, 46.593217523), (7.778174593, 46.778174593), (7.593217523, 46.958834566))
            ThreePointArc((7.593217523, 46.958834566), (6.4759337, 46.521589858), (5.538577987, 45.772677084))
            ThreePointArc((5.538577987, 45.772677084), (5.142533172, 46.078089684), (4.729683951, 46.360373002))
            ThreePointArc((4.729683951, 46.360373002), (5.15228348, 47.483278035), (5.222868219, 48.680994141))
            ThreePointArc((5.222868219, 48.680994141), (4.993895497, 48.801071766), (4.762163869, 48.915734733))
            ThreePointArc((4.762163869, 48.915734733), (3.834679853, 48.154630615), (3.174628369, 47.152713396))
            ThreePointArc((3.174628369, 47.152713396), (2.703589684, 47.320793461), (2.223716399, 47.461683425))
            ThreePointArc((2.223716399, 47.461683425), (2.278635697, 48.66022001), (1.975651141, 49.821127601))
            ThreePointArc((1.975651141, 49.821127601), (1.720779115, 49.864571747), (1.464956435, 49.902013697))
        make_face()
    extrude(amount=EXTRUDE_10_DEPTH, both=True)


solid = part.part
